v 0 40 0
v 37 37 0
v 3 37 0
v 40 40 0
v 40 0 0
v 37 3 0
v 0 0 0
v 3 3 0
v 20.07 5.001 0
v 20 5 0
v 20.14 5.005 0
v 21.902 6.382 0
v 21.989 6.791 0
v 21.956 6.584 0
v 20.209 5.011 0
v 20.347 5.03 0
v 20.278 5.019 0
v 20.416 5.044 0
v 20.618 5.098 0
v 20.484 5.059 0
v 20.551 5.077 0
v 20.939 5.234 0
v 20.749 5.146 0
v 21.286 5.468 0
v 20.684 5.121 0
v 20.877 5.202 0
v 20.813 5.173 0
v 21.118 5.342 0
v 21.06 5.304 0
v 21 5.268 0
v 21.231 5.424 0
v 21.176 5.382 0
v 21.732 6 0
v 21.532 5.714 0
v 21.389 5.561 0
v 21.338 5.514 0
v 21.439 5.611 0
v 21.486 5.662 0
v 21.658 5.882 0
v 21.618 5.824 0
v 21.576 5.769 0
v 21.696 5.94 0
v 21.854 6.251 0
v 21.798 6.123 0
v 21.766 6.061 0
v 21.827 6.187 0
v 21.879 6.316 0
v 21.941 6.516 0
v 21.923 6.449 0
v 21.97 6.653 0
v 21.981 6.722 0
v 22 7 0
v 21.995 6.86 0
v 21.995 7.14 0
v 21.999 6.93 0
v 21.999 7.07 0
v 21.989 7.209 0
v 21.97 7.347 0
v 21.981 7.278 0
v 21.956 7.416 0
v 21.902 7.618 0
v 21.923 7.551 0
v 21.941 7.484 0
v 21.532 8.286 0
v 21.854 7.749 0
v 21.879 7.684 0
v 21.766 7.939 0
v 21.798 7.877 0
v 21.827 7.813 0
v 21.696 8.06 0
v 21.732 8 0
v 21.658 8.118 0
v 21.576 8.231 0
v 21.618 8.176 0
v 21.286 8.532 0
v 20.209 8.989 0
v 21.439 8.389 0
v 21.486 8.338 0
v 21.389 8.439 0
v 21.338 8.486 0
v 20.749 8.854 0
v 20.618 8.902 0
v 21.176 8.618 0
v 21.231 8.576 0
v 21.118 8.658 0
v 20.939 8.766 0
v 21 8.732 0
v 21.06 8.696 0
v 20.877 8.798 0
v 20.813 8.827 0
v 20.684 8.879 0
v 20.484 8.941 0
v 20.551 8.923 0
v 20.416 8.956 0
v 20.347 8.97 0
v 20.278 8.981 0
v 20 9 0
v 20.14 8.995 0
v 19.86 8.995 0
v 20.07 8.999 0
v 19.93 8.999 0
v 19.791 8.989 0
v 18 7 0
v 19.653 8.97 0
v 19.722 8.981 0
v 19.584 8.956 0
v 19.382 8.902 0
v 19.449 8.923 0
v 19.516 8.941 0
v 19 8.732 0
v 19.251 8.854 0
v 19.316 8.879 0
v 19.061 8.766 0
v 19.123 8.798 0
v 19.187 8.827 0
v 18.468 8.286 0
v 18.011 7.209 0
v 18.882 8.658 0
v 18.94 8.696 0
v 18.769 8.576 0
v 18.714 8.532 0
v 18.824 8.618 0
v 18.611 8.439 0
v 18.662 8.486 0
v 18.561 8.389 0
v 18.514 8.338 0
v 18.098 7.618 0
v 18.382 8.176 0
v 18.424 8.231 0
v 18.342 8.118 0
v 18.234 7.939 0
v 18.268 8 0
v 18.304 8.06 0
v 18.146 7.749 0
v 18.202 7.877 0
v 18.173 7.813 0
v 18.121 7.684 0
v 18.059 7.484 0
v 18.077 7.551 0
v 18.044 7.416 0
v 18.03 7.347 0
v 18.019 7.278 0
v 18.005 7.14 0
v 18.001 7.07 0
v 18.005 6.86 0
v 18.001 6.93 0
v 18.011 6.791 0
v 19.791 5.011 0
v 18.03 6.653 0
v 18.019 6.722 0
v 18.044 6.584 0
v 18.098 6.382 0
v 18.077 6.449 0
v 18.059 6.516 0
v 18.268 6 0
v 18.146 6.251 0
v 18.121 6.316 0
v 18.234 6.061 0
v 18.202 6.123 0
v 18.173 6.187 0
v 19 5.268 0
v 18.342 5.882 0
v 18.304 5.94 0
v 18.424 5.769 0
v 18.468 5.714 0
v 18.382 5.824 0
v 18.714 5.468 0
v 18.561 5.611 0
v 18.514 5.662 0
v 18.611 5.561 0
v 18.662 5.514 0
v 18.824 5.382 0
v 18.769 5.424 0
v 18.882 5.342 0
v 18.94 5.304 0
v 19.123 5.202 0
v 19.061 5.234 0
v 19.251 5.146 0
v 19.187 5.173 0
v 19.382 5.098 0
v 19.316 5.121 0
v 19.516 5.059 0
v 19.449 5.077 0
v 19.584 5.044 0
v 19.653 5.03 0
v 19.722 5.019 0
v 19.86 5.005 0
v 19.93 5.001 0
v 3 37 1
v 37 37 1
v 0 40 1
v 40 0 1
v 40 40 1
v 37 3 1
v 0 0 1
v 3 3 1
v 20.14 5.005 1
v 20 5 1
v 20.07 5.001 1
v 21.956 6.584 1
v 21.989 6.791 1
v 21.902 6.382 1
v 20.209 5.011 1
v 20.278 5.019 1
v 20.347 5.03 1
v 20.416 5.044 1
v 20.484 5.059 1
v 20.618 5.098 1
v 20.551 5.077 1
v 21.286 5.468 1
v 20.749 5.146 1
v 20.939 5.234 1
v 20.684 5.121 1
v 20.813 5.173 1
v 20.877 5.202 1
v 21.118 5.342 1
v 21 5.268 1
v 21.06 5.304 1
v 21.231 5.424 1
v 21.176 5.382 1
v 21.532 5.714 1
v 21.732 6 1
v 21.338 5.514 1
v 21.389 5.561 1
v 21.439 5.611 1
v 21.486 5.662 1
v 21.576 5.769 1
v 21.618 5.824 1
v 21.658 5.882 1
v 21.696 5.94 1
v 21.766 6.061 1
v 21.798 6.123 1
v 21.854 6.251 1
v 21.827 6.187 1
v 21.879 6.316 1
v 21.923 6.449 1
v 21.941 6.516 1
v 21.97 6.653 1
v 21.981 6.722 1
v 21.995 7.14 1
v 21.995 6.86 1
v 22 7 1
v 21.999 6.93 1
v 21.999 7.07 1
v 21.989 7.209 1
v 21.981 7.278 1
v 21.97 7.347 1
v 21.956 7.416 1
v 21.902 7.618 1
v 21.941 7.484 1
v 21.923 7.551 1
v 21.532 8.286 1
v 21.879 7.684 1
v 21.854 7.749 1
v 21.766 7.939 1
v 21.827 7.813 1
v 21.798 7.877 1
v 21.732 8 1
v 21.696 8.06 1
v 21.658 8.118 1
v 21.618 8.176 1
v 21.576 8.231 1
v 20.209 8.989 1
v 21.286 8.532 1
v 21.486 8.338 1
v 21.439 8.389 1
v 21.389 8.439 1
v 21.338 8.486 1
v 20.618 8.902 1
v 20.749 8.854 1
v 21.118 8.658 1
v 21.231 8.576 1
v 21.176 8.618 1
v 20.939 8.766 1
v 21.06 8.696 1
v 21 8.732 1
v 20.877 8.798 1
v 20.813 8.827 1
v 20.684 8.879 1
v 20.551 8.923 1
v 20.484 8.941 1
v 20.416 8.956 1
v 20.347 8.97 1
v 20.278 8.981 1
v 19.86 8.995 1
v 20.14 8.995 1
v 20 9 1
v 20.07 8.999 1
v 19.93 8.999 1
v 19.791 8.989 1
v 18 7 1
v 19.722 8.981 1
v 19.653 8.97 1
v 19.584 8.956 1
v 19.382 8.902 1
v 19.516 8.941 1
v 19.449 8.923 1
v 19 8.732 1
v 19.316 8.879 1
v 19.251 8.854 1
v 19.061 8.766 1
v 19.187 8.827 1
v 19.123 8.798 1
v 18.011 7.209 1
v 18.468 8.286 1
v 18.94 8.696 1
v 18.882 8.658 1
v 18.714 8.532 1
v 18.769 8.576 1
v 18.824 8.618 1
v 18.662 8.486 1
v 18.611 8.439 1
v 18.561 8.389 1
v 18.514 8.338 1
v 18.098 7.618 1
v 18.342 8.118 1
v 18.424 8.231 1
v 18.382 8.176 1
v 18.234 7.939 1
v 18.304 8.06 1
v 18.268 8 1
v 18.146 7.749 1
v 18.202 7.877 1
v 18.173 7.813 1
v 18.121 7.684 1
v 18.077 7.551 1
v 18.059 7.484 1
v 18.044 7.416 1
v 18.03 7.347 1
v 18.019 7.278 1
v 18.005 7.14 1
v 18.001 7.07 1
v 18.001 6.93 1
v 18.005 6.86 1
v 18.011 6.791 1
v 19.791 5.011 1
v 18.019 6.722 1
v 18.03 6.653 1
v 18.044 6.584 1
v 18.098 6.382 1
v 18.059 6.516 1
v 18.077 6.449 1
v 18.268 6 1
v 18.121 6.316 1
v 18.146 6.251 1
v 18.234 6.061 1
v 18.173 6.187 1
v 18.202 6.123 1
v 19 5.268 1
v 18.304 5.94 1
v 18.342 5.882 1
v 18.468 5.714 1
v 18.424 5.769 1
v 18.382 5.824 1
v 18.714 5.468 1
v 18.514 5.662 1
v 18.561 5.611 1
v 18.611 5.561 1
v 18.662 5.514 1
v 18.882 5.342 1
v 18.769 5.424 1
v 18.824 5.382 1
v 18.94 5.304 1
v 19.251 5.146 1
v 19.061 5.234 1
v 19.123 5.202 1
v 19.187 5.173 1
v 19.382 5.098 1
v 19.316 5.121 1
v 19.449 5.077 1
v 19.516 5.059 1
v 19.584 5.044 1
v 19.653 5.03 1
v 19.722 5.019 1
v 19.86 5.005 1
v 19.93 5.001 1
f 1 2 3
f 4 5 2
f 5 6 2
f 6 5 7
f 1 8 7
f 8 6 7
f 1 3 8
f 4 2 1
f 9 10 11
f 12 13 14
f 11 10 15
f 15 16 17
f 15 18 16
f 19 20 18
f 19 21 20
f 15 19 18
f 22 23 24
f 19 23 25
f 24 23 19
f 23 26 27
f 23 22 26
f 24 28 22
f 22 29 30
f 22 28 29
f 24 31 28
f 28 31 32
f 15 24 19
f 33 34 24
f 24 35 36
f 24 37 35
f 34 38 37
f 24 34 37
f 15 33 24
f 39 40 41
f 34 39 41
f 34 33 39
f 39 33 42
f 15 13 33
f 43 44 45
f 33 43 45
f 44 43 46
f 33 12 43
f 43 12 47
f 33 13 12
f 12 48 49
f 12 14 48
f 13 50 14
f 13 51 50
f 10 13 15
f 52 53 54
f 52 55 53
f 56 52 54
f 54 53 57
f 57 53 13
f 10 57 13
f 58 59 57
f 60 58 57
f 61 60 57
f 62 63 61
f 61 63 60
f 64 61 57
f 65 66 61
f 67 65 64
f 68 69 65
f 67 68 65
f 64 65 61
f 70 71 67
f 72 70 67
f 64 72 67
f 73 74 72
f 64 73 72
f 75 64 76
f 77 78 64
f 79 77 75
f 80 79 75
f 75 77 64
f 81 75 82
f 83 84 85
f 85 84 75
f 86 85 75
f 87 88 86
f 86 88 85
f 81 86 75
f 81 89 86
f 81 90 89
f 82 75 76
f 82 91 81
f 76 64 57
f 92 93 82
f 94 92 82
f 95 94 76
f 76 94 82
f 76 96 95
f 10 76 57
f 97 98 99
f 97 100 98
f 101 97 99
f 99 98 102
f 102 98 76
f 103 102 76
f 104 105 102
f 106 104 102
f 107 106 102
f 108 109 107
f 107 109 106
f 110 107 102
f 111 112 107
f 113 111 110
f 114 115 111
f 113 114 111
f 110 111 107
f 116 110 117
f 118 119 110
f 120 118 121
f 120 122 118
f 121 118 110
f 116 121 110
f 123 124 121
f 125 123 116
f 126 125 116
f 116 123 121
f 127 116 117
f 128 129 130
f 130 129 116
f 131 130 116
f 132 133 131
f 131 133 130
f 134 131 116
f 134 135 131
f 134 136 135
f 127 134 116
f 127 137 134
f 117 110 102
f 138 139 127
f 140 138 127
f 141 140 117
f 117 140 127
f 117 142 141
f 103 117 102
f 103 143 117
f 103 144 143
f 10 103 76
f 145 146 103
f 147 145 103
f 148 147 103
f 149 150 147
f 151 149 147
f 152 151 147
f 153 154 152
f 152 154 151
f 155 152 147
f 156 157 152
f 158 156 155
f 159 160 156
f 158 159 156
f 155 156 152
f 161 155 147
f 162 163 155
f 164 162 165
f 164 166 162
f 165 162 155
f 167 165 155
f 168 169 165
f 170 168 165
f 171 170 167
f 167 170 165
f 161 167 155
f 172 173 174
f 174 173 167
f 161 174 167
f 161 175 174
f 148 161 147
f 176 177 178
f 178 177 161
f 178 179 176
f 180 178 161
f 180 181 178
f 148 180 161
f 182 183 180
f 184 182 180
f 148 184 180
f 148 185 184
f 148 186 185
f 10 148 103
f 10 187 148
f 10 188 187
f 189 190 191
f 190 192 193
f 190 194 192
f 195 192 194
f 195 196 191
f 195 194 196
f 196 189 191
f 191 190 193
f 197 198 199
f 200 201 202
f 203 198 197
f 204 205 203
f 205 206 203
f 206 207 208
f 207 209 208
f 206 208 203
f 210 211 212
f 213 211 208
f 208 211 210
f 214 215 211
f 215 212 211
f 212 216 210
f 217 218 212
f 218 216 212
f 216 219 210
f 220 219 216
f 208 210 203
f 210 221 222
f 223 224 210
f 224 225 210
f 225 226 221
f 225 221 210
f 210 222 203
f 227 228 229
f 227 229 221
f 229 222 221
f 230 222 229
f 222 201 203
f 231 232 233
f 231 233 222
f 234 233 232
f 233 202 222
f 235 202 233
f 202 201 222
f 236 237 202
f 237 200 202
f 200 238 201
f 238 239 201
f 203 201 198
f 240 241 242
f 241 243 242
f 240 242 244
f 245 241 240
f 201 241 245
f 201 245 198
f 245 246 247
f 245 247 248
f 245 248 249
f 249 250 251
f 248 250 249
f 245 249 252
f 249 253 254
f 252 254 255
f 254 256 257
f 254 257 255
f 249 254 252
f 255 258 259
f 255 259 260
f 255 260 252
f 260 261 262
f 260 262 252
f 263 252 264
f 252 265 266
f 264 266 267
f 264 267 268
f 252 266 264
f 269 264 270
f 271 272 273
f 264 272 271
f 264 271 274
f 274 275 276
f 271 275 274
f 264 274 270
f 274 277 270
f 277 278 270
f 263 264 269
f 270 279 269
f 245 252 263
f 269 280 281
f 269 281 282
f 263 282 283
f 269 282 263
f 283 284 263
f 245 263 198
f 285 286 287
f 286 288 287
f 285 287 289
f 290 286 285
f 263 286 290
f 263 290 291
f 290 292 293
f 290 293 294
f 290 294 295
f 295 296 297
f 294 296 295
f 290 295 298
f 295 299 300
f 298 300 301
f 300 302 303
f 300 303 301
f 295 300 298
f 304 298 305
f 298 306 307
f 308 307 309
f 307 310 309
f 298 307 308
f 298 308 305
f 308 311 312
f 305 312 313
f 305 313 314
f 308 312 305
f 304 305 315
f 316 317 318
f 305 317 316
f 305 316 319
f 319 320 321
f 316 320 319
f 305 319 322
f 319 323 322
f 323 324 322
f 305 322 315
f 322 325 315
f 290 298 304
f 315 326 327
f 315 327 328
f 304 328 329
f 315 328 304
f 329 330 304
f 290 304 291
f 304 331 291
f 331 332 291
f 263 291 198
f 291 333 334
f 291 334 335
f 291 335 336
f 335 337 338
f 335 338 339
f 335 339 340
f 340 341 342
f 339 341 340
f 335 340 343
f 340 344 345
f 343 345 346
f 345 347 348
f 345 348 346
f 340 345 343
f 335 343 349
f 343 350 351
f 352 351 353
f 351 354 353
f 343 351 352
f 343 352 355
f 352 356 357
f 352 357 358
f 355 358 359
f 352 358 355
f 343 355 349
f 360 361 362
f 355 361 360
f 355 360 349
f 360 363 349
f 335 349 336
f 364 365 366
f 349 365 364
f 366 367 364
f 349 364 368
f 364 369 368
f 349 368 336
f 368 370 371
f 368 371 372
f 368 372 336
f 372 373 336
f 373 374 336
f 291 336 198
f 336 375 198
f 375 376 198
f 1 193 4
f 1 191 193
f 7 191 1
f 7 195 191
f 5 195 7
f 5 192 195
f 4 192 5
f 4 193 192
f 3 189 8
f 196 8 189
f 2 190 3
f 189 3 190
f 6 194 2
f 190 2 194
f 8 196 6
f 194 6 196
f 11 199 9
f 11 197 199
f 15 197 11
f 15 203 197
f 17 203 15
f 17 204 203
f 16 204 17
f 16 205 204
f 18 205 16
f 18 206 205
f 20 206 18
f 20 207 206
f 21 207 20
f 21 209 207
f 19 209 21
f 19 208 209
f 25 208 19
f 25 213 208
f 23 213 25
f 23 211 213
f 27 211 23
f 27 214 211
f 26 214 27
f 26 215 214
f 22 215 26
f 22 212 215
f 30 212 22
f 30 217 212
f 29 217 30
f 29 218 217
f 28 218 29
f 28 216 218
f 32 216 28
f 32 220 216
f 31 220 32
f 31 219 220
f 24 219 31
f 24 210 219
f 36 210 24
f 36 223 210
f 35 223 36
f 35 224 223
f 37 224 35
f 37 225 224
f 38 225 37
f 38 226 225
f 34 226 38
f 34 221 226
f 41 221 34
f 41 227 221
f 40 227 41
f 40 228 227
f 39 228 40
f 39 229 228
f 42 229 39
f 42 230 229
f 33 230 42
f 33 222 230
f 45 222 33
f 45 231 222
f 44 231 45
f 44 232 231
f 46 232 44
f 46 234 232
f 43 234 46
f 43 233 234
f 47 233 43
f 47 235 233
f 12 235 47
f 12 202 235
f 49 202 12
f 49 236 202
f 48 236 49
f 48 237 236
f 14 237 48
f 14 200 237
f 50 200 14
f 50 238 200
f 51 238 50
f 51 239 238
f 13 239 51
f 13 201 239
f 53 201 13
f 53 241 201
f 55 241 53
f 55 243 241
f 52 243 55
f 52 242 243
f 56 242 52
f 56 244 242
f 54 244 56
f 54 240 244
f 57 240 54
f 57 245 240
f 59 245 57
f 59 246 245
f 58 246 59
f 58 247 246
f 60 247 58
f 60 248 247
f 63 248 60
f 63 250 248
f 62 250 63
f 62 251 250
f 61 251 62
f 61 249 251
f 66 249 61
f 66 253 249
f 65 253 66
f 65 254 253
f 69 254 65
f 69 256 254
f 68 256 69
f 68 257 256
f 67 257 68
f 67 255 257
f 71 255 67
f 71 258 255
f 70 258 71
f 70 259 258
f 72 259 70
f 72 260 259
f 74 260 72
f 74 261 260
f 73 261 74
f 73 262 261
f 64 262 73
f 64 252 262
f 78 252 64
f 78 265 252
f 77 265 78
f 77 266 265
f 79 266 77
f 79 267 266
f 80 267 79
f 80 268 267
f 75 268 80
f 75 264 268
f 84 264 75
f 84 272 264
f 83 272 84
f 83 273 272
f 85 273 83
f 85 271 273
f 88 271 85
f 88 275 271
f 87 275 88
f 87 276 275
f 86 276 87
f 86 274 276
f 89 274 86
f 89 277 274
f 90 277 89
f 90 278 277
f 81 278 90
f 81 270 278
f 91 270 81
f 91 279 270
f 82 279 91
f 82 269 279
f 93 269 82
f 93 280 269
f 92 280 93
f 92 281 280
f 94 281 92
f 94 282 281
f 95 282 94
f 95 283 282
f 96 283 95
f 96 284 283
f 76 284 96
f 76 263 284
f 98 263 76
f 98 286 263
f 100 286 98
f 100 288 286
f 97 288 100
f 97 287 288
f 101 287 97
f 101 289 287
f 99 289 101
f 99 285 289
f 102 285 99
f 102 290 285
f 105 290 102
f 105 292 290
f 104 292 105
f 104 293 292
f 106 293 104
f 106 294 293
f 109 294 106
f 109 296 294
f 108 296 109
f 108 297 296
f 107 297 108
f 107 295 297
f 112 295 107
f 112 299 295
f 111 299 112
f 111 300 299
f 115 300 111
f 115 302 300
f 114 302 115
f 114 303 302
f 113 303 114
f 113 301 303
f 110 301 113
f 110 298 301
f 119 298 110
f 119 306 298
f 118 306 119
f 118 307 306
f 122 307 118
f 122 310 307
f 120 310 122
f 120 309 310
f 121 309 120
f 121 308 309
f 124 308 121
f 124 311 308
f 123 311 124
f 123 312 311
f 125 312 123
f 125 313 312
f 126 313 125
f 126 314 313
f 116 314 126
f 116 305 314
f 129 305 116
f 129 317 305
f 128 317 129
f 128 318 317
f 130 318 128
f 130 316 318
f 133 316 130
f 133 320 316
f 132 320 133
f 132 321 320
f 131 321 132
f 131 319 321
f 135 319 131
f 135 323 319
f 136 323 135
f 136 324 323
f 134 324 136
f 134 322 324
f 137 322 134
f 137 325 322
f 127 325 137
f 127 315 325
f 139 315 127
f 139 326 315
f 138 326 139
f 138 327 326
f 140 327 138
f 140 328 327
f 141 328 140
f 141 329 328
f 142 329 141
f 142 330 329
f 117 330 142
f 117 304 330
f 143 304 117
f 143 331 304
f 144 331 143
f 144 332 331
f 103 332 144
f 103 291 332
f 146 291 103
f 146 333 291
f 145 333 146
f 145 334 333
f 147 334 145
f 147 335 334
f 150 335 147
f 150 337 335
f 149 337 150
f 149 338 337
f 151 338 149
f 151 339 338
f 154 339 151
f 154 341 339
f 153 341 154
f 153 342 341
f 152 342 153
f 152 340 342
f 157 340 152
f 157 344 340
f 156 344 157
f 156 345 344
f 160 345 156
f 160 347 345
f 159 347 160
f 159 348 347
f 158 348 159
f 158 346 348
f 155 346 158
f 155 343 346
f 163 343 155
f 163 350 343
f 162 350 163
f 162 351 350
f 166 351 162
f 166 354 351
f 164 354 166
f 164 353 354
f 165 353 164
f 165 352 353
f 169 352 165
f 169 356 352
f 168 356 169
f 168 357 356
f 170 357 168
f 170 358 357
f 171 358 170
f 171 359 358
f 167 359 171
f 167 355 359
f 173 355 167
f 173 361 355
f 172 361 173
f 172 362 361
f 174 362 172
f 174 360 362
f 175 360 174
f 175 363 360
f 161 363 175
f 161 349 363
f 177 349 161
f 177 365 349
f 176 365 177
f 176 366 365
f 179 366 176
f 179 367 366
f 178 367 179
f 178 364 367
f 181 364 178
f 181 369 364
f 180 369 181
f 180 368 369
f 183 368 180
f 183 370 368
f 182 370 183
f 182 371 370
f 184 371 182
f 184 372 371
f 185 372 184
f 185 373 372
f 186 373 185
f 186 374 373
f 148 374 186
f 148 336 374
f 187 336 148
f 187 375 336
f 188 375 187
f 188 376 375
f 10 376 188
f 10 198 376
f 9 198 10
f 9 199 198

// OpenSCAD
$fn=180;

linear_extrude(1) {
	difference() {
		square(40);
		translate([3, 3, 0]) {
			square(34);
		}
	}
	translate([20, 7, 0]) {
		circle(2);
	}
}
